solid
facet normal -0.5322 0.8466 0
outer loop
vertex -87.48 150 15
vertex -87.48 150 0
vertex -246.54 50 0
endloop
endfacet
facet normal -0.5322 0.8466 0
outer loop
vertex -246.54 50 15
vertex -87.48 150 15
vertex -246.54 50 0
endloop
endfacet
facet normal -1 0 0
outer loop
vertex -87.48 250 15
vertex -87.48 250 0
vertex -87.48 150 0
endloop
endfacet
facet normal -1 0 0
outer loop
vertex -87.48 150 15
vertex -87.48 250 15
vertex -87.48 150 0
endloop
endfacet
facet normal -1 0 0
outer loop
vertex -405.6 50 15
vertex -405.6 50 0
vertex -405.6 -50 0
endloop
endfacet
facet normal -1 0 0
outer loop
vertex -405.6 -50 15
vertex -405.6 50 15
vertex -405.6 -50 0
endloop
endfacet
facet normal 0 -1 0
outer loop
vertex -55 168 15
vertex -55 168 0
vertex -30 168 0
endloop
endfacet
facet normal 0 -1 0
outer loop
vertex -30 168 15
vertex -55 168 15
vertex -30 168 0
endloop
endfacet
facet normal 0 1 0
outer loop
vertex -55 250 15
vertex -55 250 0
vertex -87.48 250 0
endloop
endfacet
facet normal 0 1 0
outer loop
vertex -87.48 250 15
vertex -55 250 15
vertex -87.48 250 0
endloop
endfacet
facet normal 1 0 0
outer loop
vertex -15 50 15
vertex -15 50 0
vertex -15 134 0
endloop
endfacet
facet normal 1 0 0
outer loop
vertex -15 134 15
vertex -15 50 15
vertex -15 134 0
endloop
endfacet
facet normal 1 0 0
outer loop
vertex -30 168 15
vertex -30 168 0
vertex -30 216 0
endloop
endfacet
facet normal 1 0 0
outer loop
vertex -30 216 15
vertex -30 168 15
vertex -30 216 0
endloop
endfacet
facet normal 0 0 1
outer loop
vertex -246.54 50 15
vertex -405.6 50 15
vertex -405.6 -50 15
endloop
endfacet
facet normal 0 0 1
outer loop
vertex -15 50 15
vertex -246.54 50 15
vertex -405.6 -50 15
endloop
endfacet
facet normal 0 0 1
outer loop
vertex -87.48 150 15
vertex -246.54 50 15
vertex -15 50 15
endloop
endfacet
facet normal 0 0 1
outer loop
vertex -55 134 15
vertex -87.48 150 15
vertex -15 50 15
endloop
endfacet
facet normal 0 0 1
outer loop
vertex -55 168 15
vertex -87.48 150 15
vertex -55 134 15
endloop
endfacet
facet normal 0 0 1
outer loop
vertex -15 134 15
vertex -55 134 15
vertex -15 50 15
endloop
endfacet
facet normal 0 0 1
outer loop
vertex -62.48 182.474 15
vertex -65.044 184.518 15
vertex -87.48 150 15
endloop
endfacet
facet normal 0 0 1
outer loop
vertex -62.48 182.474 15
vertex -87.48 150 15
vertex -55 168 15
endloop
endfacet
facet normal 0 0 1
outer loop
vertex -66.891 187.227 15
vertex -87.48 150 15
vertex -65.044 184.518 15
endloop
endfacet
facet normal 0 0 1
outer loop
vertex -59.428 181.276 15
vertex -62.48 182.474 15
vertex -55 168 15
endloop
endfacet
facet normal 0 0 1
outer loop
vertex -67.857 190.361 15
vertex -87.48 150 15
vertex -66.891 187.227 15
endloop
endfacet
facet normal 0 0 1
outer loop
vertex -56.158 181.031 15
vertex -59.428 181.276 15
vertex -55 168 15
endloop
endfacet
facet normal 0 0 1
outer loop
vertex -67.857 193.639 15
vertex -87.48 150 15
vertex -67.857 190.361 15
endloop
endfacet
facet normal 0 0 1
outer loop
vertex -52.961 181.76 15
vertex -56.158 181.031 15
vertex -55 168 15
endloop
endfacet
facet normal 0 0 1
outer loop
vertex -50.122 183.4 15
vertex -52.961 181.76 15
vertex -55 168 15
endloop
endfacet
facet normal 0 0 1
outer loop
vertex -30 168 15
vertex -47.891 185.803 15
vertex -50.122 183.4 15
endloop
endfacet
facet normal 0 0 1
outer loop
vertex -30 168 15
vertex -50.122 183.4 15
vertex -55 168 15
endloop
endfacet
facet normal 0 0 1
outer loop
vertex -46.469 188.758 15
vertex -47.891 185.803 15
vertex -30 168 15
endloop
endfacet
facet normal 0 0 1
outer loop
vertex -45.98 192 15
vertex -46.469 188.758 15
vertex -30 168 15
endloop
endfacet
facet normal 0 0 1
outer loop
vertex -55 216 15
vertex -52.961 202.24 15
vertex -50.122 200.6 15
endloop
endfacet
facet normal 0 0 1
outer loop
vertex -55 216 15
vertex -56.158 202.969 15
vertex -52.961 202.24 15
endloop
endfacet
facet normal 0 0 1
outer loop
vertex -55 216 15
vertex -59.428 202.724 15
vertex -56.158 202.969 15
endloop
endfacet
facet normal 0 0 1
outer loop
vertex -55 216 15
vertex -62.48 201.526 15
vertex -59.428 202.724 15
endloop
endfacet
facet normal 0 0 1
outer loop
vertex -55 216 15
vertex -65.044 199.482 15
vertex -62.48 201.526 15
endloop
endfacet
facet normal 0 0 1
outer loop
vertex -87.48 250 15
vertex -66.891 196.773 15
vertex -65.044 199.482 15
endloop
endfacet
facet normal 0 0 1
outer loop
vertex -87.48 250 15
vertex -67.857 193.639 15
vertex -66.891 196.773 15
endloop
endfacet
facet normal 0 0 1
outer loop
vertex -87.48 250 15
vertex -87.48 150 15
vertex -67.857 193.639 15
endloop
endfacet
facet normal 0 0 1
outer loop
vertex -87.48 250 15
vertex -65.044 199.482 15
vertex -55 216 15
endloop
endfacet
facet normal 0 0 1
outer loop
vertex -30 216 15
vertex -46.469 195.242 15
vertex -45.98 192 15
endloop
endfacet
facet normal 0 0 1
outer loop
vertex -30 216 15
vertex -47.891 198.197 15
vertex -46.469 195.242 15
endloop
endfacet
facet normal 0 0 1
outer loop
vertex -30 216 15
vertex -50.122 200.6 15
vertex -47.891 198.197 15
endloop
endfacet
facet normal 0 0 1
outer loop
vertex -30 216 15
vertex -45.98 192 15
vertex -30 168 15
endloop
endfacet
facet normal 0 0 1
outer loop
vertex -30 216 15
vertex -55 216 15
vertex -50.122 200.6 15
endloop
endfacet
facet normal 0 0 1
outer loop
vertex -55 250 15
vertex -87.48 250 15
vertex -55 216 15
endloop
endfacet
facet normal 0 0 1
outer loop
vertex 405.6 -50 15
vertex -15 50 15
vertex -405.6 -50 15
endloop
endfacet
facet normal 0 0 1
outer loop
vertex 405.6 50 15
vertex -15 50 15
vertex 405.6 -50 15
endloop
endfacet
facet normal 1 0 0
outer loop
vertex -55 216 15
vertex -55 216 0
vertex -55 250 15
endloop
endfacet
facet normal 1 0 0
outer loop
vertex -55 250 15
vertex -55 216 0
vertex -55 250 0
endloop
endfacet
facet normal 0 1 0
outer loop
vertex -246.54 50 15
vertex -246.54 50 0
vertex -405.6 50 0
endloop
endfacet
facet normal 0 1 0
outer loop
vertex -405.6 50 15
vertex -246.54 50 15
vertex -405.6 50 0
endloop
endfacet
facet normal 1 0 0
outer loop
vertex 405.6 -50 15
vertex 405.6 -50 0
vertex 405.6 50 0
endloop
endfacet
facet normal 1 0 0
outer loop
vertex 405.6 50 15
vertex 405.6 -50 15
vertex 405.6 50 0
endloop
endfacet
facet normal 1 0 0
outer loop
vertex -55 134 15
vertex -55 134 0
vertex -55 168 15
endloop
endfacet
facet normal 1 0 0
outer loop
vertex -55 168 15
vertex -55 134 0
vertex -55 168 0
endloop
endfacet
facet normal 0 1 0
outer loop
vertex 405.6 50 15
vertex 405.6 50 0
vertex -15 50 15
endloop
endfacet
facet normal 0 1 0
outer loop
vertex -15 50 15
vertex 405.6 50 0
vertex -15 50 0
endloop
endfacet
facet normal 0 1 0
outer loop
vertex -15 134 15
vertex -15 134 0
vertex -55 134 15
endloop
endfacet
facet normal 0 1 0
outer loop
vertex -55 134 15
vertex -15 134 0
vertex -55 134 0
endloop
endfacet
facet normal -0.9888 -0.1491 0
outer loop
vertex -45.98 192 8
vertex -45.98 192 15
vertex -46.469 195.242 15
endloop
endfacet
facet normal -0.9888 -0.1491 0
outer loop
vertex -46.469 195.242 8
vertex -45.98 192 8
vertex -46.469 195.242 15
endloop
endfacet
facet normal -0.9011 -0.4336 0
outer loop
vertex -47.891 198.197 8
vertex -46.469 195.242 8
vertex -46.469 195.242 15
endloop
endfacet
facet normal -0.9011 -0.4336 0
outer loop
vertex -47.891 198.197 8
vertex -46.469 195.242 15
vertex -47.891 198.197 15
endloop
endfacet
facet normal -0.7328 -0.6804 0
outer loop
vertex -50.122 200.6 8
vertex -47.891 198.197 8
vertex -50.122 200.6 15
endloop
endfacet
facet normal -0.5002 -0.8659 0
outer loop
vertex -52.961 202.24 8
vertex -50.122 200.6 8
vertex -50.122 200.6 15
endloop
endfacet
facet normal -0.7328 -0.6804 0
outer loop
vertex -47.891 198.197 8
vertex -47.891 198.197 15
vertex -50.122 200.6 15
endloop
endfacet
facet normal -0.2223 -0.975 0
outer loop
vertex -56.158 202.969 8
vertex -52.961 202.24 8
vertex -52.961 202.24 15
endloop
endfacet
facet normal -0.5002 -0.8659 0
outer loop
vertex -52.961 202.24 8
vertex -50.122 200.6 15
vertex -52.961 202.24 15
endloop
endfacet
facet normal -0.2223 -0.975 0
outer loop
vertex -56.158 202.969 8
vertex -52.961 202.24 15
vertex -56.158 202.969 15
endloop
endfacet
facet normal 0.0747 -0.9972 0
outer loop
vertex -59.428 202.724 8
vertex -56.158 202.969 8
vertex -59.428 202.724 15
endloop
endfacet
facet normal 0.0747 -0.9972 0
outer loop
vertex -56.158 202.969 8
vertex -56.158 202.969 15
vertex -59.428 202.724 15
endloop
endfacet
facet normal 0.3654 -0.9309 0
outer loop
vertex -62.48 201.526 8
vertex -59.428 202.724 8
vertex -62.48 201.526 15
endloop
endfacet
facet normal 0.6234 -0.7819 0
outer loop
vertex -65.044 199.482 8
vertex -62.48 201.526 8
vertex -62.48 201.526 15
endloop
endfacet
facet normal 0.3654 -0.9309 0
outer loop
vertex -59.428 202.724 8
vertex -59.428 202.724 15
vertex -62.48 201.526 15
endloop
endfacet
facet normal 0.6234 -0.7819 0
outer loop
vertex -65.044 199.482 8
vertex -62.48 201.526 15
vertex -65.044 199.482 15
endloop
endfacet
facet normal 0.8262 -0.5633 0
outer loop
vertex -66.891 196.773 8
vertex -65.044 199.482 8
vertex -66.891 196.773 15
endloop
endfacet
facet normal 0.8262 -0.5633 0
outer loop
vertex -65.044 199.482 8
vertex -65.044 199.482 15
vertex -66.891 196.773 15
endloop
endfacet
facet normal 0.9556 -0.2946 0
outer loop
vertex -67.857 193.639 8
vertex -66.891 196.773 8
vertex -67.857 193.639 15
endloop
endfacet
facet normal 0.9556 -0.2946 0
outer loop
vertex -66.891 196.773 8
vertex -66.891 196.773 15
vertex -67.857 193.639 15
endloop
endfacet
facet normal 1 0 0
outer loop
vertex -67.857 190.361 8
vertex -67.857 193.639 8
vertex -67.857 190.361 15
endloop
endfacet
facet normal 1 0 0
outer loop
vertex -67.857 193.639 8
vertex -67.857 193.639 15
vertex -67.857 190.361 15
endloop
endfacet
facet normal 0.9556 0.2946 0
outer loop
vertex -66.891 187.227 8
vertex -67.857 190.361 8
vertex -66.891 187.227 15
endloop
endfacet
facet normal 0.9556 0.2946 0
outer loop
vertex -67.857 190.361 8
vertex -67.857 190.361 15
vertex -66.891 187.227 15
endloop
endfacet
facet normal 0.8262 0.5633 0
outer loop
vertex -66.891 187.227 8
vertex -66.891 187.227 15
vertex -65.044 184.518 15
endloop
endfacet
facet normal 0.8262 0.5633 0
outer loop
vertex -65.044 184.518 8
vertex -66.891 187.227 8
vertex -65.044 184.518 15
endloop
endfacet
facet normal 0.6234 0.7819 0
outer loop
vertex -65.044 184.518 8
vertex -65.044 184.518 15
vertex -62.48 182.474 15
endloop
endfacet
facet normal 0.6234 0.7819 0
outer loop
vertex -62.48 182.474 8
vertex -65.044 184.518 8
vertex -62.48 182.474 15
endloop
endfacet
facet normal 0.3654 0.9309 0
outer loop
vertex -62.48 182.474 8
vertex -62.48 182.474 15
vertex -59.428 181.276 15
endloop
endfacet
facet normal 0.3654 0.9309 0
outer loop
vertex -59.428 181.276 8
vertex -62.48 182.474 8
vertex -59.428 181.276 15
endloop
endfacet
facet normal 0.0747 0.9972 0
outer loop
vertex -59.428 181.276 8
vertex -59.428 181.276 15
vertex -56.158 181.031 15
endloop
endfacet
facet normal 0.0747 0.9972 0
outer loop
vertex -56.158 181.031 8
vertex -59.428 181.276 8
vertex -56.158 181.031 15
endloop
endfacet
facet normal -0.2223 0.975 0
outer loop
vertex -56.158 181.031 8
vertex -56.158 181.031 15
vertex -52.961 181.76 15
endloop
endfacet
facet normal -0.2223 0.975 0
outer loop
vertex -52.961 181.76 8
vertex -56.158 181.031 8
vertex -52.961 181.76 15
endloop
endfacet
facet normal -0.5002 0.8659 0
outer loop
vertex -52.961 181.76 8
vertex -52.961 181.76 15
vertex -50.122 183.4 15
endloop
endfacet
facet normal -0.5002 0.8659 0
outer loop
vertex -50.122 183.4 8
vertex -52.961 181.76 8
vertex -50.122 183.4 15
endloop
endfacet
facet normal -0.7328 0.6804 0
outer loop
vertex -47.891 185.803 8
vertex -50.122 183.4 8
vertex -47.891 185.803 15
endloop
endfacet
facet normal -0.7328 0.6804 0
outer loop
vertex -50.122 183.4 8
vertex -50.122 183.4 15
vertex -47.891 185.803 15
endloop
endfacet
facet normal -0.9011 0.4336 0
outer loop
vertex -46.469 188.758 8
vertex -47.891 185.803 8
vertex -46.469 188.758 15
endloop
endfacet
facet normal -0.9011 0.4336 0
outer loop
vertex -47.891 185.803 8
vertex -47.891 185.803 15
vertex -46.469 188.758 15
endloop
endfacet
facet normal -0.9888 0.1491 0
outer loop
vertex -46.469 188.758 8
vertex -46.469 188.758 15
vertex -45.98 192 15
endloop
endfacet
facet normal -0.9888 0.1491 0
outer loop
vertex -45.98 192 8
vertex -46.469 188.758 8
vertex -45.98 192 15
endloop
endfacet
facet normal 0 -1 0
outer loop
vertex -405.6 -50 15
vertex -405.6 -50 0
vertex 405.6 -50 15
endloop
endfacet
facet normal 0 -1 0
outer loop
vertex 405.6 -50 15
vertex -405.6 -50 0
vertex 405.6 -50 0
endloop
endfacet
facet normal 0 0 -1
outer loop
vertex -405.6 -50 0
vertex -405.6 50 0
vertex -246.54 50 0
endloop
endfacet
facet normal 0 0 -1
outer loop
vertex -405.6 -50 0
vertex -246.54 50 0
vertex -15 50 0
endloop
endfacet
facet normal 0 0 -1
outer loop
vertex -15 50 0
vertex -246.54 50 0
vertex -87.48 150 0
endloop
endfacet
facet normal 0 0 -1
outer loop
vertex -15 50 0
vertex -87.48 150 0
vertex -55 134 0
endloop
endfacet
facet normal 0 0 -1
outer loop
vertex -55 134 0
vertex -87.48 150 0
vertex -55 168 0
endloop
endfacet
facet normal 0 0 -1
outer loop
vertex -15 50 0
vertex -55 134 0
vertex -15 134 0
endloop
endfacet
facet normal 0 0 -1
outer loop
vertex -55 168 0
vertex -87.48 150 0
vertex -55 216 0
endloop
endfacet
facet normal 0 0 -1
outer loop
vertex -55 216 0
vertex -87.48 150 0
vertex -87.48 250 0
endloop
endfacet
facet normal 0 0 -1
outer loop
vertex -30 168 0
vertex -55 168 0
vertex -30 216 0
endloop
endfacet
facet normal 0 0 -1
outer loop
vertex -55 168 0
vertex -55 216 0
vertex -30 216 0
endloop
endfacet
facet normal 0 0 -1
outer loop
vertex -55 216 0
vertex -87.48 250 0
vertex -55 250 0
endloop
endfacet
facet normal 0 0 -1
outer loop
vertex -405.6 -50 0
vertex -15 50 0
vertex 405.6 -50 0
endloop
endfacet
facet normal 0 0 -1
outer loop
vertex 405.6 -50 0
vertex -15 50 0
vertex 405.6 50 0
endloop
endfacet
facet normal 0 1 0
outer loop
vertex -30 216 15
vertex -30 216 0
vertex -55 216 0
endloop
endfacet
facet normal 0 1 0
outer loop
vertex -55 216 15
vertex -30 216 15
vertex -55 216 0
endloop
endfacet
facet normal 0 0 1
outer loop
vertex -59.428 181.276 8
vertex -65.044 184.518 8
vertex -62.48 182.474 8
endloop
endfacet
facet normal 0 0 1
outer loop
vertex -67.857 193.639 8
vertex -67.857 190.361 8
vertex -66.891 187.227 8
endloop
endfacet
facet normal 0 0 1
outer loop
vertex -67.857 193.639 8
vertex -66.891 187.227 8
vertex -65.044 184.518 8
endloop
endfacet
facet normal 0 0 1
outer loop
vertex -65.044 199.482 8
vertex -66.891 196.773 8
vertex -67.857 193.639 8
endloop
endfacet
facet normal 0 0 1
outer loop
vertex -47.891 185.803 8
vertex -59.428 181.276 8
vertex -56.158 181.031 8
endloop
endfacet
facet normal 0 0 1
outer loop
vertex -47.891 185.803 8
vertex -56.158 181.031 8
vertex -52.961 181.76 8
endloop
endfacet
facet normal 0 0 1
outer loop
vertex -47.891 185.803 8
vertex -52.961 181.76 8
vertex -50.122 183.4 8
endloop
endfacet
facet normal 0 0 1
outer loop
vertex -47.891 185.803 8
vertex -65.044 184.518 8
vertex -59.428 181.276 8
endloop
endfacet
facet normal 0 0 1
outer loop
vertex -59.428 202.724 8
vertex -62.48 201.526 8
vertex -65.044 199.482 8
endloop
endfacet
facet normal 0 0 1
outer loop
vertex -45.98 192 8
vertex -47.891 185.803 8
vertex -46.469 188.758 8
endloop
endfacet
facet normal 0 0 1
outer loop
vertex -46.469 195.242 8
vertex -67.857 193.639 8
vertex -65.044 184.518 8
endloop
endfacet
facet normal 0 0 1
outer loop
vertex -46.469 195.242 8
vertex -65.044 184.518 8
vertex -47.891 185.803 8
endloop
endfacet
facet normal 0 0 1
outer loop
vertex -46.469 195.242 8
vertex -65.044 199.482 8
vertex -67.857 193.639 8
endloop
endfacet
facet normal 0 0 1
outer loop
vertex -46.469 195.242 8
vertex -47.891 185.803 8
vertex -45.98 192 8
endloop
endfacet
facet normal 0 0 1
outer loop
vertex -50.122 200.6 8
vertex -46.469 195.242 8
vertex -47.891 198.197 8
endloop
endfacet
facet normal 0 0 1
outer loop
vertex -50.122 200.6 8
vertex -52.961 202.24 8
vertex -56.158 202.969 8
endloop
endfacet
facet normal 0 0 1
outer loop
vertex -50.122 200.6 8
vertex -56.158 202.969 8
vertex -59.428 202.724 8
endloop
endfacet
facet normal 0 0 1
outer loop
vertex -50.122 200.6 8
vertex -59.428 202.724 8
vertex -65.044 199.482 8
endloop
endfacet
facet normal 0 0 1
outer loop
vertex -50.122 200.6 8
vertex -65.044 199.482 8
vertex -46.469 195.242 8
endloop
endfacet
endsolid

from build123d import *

# Parameters (mm, degrees)
SALIENTE_EXTRUIR1_DEPTH = 15
CROQUIS4_R              = 11
CORTAR_EXTRUIR1_DEPTH   = 7


with BuildPart() as part:
    # Croquis1 → Saliente-Extruir1 (new body)
    with BuildSketch(Plane.XY):
        Polygon((-15, 50), (-15, 134), (-55, 134), (-55, 168), (-30, 168), (-30, 216), (-55, 216), (-55, 250), (-87.48, 250), (-87.48, 150), (-246.54, 50), (-405.6, 50), (-405.6, -50), (405.6, -50), (405.6, 50), align=None)
    extrude(amount=SALIENTE_EXTRUIR1_DEPTH)

    # Croquis4 → Cortar-Extruir1 (cut)
    with BuildSketch(Plane.XY.offset(15)):
        with Locations((-56.98, 192)):
            Circle(CROQUIS4_R)
    extrude(amount=-CORTAR_EXTRUIR1_DEPTH, mode=Mode.SUBTRACT)


solid = part.part
